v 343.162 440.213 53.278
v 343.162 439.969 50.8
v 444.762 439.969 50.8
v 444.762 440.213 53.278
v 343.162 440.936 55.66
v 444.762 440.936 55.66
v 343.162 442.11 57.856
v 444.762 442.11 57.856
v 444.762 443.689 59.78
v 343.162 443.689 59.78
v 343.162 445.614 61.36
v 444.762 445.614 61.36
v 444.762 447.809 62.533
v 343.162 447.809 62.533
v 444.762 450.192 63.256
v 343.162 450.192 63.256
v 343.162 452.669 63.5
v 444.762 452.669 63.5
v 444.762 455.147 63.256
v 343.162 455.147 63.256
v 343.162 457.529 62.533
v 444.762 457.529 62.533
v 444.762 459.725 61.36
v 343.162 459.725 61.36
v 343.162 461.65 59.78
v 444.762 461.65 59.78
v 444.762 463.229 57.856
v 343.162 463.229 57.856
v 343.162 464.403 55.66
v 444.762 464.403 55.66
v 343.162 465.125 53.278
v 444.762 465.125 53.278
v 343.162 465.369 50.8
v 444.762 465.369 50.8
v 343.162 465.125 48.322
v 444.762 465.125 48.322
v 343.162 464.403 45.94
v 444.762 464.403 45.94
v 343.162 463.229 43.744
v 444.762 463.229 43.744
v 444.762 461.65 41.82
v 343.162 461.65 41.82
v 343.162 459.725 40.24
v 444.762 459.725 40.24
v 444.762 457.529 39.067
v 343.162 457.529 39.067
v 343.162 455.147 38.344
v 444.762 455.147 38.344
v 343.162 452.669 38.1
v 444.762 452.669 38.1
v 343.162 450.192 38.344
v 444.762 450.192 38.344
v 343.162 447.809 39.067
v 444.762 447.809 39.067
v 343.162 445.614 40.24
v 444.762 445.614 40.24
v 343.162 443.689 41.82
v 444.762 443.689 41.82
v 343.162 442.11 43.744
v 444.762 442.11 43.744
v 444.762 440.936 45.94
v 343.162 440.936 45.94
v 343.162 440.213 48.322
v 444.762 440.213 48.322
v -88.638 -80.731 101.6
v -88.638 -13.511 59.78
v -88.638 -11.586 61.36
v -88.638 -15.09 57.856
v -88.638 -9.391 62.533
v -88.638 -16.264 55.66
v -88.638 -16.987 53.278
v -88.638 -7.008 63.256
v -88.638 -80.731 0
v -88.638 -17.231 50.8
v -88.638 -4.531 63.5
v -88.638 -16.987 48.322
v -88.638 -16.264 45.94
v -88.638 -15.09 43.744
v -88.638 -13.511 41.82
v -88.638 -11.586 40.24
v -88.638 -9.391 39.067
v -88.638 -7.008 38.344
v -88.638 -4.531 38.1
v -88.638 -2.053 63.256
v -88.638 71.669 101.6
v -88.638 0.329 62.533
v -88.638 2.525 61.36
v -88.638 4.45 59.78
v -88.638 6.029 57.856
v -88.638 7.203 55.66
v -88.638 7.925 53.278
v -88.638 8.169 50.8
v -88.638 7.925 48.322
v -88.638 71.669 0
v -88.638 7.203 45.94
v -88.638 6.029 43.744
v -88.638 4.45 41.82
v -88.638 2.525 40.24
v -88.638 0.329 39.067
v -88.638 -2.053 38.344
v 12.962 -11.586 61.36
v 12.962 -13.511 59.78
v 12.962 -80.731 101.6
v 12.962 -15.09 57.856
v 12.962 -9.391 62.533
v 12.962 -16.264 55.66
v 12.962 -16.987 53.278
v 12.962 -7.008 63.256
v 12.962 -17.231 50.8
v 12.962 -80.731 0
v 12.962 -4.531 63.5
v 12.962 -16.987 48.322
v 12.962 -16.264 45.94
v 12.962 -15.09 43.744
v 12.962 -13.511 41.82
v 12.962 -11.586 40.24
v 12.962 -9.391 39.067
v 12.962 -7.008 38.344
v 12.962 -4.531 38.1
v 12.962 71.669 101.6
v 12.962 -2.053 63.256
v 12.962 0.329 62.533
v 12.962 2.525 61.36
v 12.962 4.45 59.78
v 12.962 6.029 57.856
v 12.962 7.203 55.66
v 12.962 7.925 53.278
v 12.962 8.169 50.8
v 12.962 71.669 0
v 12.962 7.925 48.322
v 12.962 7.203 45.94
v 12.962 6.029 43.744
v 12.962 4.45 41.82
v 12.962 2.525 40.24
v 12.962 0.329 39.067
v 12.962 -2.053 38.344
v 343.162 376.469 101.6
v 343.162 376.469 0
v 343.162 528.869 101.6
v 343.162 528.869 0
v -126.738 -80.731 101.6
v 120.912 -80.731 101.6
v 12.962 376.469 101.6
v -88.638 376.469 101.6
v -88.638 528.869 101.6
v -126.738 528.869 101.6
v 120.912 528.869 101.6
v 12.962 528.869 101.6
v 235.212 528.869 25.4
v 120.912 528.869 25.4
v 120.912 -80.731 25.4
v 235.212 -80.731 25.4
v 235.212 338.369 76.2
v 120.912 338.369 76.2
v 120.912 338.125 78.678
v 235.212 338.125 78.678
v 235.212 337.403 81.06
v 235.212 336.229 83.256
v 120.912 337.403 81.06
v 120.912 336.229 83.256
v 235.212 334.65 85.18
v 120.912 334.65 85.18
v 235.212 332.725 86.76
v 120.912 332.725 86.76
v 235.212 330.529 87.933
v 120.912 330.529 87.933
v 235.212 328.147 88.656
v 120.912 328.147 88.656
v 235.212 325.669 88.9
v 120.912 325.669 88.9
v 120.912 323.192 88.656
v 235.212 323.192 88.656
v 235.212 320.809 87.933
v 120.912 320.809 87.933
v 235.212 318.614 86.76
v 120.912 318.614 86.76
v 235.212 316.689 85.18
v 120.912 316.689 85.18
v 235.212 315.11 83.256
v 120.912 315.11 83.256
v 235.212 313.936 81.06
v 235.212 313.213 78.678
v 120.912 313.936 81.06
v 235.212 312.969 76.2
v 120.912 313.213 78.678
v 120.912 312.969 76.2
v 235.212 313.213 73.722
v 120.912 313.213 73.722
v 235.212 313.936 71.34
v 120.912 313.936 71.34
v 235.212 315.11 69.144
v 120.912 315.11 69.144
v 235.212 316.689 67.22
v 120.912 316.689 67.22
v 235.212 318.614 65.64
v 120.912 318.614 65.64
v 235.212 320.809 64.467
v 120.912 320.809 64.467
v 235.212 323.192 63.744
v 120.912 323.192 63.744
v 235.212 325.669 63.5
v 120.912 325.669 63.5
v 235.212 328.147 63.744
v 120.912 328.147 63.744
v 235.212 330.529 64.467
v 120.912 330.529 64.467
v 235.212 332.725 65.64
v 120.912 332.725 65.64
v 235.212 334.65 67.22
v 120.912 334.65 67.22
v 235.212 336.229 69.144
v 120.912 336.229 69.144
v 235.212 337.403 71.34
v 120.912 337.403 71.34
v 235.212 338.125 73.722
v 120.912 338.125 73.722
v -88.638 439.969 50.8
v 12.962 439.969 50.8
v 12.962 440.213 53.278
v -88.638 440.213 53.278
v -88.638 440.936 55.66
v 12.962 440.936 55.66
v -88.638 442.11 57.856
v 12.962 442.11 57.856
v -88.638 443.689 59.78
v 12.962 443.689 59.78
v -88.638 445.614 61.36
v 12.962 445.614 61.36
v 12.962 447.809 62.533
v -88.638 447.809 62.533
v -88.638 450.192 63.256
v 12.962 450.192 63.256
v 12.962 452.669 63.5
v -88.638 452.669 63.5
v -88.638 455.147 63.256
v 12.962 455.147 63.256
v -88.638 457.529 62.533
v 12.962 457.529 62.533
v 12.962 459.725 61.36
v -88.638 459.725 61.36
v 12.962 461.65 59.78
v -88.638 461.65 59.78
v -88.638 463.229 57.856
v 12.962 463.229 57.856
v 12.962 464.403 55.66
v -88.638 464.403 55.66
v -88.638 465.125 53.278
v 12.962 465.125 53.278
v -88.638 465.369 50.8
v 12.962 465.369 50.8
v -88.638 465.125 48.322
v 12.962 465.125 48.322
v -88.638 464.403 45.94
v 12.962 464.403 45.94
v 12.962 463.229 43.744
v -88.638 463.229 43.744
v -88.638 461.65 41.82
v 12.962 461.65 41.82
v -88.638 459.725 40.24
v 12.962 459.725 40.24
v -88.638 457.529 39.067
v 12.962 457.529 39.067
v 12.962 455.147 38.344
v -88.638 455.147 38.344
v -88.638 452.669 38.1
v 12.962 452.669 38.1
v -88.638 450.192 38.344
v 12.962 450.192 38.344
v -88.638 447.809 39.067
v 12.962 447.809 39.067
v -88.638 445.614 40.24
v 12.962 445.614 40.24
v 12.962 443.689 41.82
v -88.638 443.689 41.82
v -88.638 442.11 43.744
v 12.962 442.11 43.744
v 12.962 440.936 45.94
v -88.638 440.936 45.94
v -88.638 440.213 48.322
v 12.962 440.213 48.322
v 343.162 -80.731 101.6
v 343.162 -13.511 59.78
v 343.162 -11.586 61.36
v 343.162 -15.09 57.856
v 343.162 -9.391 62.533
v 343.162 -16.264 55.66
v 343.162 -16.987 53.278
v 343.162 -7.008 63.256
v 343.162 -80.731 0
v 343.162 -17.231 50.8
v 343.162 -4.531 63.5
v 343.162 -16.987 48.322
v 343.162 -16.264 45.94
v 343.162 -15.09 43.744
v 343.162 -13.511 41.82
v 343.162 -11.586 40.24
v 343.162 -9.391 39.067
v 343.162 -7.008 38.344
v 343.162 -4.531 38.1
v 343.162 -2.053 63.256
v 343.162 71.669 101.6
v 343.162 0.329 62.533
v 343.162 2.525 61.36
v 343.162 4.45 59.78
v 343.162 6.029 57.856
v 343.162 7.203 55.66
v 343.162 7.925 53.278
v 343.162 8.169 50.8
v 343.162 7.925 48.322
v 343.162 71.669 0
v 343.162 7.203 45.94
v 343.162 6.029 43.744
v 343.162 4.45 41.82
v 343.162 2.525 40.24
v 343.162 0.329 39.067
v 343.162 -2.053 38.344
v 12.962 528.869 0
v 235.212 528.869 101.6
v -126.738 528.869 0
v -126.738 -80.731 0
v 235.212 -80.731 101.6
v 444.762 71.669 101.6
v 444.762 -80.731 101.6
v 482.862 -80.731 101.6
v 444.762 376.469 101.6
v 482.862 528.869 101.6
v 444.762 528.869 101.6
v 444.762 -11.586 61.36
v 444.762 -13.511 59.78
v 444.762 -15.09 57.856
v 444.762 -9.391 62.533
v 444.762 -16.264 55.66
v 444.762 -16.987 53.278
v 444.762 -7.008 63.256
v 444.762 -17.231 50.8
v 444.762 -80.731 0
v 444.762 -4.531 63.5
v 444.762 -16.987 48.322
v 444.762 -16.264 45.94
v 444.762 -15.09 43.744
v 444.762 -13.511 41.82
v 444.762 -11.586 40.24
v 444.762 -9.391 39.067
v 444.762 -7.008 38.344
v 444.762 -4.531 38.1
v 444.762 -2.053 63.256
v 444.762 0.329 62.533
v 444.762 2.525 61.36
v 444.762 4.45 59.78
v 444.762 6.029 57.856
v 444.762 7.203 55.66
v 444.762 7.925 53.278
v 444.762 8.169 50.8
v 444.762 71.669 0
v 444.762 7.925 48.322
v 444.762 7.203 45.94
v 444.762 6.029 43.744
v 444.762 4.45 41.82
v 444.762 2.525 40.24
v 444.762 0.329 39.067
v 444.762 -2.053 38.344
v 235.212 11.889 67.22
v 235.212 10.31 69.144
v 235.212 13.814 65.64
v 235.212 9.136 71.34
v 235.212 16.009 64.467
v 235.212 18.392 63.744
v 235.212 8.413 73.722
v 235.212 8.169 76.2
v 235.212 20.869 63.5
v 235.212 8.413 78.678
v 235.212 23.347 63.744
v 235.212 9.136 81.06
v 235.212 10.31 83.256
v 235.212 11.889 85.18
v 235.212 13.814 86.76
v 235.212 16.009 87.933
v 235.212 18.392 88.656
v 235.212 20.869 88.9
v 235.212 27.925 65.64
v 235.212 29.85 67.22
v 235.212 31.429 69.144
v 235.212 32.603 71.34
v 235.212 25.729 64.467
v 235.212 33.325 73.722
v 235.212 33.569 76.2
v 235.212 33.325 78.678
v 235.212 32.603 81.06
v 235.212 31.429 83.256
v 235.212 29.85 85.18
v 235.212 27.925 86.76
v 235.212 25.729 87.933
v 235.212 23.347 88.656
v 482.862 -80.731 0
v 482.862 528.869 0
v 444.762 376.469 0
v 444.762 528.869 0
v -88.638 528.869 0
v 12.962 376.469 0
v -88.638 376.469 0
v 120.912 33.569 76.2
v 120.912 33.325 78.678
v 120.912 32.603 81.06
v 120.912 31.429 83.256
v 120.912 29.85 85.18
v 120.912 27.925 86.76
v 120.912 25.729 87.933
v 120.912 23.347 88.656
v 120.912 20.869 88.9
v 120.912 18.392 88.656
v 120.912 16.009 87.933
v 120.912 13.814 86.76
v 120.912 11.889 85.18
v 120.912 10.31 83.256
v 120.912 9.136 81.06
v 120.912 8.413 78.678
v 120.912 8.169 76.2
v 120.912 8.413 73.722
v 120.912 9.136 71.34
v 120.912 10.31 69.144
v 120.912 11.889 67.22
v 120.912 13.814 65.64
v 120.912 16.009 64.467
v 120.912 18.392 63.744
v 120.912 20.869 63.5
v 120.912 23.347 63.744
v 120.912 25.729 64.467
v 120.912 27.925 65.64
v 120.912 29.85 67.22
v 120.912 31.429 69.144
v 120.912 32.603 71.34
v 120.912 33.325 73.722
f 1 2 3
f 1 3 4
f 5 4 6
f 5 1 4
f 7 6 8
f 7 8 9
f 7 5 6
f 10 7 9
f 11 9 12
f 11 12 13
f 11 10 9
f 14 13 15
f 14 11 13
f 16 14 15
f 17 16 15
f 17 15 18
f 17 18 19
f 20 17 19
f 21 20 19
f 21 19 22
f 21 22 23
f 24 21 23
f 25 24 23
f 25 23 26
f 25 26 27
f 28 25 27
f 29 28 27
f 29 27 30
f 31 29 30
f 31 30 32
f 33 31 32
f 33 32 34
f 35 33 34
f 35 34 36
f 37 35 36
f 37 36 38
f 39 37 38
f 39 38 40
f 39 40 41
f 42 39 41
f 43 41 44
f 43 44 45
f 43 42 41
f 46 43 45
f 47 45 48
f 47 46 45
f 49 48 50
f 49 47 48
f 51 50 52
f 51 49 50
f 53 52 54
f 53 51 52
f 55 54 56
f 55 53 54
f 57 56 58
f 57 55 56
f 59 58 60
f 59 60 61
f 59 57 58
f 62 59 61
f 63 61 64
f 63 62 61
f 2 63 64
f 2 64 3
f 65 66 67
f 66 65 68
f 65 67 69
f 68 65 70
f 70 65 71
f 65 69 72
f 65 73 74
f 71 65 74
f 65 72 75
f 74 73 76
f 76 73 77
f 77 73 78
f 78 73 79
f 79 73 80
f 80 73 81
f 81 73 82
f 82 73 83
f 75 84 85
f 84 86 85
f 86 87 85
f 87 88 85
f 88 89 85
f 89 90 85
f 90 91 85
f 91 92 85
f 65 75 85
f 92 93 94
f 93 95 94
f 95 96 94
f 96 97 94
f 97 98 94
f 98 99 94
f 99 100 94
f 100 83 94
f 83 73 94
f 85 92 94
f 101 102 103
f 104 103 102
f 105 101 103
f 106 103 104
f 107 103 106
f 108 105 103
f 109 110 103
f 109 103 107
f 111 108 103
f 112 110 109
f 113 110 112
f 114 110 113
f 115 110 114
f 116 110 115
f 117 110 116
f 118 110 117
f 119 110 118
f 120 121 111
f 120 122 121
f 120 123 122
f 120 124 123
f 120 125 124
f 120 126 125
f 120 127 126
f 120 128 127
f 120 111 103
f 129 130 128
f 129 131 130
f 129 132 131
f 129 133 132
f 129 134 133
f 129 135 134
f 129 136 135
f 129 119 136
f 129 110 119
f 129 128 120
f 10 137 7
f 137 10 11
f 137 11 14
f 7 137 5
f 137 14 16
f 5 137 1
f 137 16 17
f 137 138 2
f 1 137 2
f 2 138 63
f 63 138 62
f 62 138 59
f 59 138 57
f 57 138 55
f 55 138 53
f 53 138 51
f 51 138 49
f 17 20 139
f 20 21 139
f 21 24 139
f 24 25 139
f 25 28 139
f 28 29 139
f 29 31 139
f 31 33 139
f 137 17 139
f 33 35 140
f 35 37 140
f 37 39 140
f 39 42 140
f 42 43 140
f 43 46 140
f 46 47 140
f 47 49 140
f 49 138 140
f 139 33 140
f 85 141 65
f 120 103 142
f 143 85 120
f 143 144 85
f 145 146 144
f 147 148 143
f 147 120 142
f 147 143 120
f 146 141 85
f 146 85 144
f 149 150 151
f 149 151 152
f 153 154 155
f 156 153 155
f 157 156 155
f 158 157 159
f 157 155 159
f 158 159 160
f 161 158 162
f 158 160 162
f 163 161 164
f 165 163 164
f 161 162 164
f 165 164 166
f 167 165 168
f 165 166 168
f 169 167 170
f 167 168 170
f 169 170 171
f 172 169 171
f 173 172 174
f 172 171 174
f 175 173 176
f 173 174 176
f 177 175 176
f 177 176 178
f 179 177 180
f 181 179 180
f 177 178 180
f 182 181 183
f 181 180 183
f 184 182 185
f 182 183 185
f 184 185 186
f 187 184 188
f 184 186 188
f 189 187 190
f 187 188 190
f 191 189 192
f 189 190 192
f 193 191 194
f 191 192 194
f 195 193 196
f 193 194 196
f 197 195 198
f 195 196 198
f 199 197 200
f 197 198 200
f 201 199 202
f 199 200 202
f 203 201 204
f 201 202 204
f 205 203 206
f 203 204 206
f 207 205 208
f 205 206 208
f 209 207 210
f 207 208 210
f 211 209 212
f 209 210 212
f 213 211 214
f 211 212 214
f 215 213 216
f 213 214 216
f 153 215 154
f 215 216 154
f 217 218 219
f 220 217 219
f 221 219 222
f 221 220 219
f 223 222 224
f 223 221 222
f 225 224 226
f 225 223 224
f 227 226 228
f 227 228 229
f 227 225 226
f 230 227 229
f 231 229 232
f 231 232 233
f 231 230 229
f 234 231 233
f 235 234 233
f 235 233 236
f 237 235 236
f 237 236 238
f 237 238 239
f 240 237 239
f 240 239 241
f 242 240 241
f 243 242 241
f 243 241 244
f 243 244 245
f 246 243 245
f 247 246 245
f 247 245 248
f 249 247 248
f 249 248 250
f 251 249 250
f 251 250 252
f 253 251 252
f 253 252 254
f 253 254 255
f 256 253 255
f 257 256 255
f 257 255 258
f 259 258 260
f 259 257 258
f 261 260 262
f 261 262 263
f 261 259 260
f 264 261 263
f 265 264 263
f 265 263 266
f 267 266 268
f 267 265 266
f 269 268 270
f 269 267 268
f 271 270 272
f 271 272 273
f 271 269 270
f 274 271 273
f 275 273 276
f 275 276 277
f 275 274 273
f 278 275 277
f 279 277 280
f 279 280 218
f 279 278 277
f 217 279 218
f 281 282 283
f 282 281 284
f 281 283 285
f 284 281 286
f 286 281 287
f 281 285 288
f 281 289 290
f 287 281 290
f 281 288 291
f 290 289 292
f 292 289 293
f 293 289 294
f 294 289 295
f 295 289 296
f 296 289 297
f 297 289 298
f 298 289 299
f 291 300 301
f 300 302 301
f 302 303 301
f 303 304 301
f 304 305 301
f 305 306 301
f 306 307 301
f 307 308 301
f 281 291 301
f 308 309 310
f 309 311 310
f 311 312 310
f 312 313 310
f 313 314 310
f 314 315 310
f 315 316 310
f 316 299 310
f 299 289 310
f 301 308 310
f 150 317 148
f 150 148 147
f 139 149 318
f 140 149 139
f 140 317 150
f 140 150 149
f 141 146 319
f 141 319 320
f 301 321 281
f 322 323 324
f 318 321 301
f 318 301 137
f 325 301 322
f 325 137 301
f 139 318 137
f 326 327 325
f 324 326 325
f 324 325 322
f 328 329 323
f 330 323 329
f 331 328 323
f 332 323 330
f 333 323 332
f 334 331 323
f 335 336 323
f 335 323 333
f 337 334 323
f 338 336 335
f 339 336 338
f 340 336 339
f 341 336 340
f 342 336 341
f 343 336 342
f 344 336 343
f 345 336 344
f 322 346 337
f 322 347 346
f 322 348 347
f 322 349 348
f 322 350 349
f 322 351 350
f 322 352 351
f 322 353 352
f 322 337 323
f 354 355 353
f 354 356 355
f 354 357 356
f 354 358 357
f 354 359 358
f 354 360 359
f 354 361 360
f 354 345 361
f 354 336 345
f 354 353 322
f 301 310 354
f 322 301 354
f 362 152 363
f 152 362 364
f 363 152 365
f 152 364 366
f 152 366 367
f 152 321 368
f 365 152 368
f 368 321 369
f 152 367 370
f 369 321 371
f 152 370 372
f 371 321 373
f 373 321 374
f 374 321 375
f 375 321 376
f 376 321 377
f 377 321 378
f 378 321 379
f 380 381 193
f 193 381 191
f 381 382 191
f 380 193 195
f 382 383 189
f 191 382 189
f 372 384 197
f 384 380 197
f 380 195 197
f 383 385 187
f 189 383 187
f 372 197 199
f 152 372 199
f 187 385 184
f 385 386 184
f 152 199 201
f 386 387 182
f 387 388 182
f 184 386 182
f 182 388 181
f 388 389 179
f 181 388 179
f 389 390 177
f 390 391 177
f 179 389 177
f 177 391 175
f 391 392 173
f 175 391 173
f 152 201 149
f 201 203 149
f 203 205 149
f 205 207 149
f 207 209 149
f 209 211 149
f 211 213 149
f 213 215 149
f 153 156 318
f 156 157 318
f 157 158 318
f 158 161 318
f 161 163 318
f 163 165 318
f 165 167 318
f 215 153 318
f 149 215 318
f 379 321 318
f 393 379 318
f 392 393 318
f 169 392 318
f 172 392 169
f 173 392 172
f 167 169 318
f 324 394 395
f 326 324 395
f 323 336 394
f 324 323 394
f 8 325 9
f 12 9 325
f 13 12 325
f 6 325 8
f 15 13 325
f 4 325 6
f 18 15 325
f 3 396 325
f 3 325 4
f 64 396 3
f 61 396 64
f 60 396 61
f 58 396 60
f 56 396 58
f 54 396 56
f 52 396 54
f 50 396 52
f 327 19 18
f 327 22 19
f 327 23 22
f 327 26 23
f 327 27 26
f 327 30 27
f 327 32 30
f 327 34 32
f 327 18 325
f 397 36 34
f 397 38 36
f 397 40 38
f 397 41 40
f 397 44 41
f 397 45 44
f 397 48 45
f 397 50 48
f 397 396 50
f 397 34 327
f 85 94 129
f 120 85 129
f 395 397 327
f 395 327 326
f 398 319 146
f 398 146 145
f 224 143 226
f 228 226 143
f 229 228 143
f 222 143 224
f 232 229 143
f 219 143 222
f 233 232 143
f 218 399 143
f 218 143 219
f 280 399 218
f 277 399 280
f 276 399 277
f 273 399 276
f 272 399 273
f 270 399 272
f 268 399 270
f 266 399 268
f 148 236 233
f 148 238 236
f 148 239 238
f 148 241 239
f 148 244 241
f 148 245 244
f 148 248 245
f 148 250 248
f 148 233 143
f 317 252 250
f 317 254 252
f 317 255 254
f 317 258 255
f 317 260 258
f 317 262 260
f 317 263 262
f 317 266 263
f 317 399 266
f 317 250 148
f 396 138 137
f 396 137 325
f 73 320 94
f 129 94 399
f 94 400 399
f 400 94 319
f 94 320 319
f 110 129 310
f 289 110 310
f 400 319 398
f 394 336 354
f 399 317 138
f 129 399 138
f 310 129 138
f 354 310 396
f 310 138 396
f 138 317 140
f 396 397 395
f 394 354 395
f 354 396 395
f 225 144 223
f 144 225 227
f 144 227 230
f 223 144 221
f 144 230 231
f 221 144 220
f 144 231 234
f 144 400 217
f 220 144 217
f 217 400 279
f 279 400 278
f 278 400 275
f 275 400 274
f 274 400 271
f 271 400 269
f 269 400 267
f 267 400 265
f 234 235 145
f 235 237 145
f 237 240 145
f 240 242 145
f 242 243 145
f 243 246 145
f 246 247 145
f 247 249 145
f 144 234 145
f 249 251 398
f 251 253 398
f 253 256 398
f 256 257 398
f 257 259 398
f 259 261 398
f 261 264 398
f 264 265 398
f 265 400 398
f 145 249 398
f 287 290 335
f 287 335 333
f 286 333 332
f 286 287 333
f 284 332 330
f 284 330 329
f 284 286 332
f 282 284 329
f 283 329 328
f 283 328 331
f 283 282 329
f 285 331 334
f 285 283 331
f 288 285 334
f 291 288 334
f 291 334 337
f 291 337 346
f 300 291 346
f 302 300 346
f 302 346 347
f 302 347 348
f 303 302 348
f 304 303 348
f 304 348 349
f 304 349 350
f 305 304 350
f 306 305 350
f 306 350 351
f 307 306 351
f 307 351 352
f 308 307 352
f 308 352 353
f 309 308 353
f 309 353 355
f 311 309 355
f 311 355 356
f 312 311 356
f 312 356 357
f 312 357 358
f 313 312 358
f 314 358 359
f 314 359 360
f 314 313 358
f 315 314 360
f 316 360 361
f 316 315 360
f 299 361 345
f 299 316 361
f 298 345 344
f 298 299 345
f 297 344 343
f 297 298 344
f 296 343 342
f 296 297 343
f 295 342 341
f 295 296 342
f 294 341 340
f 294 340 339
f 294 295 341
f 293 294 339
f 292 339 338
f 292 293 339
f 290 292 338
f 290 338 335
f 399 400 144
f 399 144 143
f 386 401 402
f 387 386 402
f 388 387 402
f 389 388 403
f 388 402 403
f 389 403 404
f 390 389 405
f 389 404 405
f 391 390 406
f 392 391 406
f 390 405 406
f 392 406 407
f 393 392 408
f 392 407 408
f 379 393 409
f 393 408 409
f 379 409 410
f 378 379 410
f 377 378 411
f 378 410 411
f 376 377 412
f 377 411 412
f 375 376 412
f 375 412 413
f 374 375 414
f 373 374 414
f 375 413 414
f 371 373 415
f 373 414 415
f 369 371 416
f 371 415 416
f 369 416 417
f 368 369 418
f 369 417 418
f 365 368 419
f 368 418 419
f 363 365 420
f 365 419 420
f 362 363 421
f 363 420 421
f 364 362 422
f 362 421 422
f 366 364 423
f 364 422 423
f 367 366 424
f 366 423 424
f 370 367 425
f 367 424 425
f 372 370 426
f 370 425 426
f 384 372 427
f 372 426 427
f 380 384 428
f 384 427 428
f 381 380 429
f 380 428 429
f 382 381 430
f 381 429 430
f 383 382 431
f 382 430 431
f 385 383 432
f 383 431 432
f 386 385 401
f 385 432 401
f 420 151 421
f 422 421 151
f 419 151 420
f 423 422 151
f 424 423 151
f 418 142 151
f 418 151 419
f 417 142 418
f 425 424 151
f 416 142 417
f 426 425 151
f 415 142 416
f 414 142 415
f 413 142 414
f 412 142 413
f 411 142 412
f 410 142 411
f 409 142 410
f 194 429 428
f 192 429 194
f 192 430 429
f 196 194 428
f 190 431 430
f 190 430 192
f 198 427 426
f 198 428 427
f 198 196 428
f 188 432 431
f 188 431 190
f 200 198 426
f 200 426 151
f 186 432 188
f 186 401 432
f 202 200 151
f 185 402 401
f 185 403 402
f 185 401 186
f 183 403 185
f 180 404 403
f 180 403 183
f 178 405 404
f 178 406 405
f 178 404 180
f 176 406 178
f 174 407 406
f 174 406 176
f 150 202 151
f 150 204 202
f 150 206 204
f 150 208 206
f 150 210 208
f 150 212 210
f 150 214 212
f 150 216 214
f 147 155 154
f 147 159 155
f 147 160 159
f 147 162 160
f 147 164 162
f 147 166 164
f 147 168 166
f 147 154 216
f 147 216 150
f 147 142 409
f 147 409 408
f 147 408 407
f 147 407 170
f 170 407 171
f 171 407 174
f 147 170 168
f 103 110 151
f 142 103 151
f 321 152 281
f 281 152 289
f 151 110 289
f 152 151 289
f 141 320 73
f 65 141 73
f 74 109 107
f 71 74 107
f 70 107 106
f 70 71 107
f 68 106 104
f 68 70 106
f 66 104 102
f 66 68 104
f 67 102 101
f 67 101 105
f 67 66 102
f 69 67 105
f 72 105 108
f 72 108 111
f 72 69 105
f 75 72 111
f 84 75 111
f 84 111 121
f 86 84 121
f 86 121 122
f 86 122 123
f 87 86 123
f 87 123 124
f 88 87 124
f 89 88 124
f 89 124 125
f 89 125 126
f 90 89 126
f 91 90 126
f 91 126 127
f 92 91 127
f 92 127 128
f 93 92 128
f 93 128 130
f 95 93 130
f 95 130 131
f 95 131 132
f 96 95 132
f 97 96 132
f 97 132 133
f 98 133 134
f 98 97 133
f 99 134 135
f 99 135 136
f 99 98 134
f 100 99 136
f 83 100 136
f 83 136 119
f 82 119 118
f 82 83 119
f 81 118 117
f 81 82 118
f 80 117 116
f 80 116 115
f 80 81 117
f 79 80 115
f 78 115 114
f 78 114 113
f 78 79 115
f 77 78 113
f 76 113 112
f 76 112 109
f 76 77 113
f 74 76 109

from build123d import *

# Parameters (mm, degrees)
F0_W     = 609.6
F0_H     = 609.6
F1_DEPTH = 101.6
F2_W     = 101.6
F2_H     = 152.4
F3_DEPTH = 101.6
F4_R     = 12.7
F5_DEPTH = 609.6
F6_W     = 114.3
F6_H     = 609.6
F7_DEPTH = 76.2
F8_R     = 12.7
F9_DEPTH = 114.3


with BuildPart() as f1:
    # F0 (on Top) → F1 (new body)
    with BuildSketch(Plane.XY):
        with Locations((178.062361, 224.069413)):
            Rectangle(F0_W, F0_H)
    extrude(amount=F1_DEPTH)

    # F2 (on Top) → F3 (cut)
    with BuildSketch(Plane.XY):
        with Locations((393.962361, -4.530587)):
            Rectangle(F2_W, F2_H)
        with Locations((-37.837639, -4.530587)):
            Rectangle(F2_W, F2_H)
        with Locations((-37.837639, 452.669413)):
            Rectangle(F2_W, F2_H)
        with Locations((393.962361, 452.669413)):
            Rectangle(F2_W, F2_H)
    extrude(amount=F3_DEPTH, mode=Mode.SUBTRACT)

    # F4 (on face) → F5 (join)
    with BuildSketch(Plane(origin=(-126.737639, 0, 0), x_dir=(0, -1, 0), z_dir=(-1, 0, 0))):
        with Locations((-452.669413, 50.8)):
            Circle(F4_R)
        with Locations((4.530587, 50.8)):
            Circle(F4_R)
    extrude(amount=-F5_DEPTH)

    # F6 (on face) → F7 (cut)
    with BuildSketch(Plane.XY.offset(101.6)):
        with Locations((178.062361, 224.069413)):
            Rectangle(F6_W, F6_H)
    extrude(amount=-F7_DEPTH, mode=Mode.SUBTRACT)

    # F8 (on face) → F9 (join, through all)
    with BuildSketch(Plane.YZ.offset(120.912361)):
        with Locations((20.869413, 76.2)):
            Circle(F8_R)
        with Locations((325.669413, 76.2)):
            Circle(F8_R)
    extrude(amount=F9_DEPTH)


solid = f1.part
